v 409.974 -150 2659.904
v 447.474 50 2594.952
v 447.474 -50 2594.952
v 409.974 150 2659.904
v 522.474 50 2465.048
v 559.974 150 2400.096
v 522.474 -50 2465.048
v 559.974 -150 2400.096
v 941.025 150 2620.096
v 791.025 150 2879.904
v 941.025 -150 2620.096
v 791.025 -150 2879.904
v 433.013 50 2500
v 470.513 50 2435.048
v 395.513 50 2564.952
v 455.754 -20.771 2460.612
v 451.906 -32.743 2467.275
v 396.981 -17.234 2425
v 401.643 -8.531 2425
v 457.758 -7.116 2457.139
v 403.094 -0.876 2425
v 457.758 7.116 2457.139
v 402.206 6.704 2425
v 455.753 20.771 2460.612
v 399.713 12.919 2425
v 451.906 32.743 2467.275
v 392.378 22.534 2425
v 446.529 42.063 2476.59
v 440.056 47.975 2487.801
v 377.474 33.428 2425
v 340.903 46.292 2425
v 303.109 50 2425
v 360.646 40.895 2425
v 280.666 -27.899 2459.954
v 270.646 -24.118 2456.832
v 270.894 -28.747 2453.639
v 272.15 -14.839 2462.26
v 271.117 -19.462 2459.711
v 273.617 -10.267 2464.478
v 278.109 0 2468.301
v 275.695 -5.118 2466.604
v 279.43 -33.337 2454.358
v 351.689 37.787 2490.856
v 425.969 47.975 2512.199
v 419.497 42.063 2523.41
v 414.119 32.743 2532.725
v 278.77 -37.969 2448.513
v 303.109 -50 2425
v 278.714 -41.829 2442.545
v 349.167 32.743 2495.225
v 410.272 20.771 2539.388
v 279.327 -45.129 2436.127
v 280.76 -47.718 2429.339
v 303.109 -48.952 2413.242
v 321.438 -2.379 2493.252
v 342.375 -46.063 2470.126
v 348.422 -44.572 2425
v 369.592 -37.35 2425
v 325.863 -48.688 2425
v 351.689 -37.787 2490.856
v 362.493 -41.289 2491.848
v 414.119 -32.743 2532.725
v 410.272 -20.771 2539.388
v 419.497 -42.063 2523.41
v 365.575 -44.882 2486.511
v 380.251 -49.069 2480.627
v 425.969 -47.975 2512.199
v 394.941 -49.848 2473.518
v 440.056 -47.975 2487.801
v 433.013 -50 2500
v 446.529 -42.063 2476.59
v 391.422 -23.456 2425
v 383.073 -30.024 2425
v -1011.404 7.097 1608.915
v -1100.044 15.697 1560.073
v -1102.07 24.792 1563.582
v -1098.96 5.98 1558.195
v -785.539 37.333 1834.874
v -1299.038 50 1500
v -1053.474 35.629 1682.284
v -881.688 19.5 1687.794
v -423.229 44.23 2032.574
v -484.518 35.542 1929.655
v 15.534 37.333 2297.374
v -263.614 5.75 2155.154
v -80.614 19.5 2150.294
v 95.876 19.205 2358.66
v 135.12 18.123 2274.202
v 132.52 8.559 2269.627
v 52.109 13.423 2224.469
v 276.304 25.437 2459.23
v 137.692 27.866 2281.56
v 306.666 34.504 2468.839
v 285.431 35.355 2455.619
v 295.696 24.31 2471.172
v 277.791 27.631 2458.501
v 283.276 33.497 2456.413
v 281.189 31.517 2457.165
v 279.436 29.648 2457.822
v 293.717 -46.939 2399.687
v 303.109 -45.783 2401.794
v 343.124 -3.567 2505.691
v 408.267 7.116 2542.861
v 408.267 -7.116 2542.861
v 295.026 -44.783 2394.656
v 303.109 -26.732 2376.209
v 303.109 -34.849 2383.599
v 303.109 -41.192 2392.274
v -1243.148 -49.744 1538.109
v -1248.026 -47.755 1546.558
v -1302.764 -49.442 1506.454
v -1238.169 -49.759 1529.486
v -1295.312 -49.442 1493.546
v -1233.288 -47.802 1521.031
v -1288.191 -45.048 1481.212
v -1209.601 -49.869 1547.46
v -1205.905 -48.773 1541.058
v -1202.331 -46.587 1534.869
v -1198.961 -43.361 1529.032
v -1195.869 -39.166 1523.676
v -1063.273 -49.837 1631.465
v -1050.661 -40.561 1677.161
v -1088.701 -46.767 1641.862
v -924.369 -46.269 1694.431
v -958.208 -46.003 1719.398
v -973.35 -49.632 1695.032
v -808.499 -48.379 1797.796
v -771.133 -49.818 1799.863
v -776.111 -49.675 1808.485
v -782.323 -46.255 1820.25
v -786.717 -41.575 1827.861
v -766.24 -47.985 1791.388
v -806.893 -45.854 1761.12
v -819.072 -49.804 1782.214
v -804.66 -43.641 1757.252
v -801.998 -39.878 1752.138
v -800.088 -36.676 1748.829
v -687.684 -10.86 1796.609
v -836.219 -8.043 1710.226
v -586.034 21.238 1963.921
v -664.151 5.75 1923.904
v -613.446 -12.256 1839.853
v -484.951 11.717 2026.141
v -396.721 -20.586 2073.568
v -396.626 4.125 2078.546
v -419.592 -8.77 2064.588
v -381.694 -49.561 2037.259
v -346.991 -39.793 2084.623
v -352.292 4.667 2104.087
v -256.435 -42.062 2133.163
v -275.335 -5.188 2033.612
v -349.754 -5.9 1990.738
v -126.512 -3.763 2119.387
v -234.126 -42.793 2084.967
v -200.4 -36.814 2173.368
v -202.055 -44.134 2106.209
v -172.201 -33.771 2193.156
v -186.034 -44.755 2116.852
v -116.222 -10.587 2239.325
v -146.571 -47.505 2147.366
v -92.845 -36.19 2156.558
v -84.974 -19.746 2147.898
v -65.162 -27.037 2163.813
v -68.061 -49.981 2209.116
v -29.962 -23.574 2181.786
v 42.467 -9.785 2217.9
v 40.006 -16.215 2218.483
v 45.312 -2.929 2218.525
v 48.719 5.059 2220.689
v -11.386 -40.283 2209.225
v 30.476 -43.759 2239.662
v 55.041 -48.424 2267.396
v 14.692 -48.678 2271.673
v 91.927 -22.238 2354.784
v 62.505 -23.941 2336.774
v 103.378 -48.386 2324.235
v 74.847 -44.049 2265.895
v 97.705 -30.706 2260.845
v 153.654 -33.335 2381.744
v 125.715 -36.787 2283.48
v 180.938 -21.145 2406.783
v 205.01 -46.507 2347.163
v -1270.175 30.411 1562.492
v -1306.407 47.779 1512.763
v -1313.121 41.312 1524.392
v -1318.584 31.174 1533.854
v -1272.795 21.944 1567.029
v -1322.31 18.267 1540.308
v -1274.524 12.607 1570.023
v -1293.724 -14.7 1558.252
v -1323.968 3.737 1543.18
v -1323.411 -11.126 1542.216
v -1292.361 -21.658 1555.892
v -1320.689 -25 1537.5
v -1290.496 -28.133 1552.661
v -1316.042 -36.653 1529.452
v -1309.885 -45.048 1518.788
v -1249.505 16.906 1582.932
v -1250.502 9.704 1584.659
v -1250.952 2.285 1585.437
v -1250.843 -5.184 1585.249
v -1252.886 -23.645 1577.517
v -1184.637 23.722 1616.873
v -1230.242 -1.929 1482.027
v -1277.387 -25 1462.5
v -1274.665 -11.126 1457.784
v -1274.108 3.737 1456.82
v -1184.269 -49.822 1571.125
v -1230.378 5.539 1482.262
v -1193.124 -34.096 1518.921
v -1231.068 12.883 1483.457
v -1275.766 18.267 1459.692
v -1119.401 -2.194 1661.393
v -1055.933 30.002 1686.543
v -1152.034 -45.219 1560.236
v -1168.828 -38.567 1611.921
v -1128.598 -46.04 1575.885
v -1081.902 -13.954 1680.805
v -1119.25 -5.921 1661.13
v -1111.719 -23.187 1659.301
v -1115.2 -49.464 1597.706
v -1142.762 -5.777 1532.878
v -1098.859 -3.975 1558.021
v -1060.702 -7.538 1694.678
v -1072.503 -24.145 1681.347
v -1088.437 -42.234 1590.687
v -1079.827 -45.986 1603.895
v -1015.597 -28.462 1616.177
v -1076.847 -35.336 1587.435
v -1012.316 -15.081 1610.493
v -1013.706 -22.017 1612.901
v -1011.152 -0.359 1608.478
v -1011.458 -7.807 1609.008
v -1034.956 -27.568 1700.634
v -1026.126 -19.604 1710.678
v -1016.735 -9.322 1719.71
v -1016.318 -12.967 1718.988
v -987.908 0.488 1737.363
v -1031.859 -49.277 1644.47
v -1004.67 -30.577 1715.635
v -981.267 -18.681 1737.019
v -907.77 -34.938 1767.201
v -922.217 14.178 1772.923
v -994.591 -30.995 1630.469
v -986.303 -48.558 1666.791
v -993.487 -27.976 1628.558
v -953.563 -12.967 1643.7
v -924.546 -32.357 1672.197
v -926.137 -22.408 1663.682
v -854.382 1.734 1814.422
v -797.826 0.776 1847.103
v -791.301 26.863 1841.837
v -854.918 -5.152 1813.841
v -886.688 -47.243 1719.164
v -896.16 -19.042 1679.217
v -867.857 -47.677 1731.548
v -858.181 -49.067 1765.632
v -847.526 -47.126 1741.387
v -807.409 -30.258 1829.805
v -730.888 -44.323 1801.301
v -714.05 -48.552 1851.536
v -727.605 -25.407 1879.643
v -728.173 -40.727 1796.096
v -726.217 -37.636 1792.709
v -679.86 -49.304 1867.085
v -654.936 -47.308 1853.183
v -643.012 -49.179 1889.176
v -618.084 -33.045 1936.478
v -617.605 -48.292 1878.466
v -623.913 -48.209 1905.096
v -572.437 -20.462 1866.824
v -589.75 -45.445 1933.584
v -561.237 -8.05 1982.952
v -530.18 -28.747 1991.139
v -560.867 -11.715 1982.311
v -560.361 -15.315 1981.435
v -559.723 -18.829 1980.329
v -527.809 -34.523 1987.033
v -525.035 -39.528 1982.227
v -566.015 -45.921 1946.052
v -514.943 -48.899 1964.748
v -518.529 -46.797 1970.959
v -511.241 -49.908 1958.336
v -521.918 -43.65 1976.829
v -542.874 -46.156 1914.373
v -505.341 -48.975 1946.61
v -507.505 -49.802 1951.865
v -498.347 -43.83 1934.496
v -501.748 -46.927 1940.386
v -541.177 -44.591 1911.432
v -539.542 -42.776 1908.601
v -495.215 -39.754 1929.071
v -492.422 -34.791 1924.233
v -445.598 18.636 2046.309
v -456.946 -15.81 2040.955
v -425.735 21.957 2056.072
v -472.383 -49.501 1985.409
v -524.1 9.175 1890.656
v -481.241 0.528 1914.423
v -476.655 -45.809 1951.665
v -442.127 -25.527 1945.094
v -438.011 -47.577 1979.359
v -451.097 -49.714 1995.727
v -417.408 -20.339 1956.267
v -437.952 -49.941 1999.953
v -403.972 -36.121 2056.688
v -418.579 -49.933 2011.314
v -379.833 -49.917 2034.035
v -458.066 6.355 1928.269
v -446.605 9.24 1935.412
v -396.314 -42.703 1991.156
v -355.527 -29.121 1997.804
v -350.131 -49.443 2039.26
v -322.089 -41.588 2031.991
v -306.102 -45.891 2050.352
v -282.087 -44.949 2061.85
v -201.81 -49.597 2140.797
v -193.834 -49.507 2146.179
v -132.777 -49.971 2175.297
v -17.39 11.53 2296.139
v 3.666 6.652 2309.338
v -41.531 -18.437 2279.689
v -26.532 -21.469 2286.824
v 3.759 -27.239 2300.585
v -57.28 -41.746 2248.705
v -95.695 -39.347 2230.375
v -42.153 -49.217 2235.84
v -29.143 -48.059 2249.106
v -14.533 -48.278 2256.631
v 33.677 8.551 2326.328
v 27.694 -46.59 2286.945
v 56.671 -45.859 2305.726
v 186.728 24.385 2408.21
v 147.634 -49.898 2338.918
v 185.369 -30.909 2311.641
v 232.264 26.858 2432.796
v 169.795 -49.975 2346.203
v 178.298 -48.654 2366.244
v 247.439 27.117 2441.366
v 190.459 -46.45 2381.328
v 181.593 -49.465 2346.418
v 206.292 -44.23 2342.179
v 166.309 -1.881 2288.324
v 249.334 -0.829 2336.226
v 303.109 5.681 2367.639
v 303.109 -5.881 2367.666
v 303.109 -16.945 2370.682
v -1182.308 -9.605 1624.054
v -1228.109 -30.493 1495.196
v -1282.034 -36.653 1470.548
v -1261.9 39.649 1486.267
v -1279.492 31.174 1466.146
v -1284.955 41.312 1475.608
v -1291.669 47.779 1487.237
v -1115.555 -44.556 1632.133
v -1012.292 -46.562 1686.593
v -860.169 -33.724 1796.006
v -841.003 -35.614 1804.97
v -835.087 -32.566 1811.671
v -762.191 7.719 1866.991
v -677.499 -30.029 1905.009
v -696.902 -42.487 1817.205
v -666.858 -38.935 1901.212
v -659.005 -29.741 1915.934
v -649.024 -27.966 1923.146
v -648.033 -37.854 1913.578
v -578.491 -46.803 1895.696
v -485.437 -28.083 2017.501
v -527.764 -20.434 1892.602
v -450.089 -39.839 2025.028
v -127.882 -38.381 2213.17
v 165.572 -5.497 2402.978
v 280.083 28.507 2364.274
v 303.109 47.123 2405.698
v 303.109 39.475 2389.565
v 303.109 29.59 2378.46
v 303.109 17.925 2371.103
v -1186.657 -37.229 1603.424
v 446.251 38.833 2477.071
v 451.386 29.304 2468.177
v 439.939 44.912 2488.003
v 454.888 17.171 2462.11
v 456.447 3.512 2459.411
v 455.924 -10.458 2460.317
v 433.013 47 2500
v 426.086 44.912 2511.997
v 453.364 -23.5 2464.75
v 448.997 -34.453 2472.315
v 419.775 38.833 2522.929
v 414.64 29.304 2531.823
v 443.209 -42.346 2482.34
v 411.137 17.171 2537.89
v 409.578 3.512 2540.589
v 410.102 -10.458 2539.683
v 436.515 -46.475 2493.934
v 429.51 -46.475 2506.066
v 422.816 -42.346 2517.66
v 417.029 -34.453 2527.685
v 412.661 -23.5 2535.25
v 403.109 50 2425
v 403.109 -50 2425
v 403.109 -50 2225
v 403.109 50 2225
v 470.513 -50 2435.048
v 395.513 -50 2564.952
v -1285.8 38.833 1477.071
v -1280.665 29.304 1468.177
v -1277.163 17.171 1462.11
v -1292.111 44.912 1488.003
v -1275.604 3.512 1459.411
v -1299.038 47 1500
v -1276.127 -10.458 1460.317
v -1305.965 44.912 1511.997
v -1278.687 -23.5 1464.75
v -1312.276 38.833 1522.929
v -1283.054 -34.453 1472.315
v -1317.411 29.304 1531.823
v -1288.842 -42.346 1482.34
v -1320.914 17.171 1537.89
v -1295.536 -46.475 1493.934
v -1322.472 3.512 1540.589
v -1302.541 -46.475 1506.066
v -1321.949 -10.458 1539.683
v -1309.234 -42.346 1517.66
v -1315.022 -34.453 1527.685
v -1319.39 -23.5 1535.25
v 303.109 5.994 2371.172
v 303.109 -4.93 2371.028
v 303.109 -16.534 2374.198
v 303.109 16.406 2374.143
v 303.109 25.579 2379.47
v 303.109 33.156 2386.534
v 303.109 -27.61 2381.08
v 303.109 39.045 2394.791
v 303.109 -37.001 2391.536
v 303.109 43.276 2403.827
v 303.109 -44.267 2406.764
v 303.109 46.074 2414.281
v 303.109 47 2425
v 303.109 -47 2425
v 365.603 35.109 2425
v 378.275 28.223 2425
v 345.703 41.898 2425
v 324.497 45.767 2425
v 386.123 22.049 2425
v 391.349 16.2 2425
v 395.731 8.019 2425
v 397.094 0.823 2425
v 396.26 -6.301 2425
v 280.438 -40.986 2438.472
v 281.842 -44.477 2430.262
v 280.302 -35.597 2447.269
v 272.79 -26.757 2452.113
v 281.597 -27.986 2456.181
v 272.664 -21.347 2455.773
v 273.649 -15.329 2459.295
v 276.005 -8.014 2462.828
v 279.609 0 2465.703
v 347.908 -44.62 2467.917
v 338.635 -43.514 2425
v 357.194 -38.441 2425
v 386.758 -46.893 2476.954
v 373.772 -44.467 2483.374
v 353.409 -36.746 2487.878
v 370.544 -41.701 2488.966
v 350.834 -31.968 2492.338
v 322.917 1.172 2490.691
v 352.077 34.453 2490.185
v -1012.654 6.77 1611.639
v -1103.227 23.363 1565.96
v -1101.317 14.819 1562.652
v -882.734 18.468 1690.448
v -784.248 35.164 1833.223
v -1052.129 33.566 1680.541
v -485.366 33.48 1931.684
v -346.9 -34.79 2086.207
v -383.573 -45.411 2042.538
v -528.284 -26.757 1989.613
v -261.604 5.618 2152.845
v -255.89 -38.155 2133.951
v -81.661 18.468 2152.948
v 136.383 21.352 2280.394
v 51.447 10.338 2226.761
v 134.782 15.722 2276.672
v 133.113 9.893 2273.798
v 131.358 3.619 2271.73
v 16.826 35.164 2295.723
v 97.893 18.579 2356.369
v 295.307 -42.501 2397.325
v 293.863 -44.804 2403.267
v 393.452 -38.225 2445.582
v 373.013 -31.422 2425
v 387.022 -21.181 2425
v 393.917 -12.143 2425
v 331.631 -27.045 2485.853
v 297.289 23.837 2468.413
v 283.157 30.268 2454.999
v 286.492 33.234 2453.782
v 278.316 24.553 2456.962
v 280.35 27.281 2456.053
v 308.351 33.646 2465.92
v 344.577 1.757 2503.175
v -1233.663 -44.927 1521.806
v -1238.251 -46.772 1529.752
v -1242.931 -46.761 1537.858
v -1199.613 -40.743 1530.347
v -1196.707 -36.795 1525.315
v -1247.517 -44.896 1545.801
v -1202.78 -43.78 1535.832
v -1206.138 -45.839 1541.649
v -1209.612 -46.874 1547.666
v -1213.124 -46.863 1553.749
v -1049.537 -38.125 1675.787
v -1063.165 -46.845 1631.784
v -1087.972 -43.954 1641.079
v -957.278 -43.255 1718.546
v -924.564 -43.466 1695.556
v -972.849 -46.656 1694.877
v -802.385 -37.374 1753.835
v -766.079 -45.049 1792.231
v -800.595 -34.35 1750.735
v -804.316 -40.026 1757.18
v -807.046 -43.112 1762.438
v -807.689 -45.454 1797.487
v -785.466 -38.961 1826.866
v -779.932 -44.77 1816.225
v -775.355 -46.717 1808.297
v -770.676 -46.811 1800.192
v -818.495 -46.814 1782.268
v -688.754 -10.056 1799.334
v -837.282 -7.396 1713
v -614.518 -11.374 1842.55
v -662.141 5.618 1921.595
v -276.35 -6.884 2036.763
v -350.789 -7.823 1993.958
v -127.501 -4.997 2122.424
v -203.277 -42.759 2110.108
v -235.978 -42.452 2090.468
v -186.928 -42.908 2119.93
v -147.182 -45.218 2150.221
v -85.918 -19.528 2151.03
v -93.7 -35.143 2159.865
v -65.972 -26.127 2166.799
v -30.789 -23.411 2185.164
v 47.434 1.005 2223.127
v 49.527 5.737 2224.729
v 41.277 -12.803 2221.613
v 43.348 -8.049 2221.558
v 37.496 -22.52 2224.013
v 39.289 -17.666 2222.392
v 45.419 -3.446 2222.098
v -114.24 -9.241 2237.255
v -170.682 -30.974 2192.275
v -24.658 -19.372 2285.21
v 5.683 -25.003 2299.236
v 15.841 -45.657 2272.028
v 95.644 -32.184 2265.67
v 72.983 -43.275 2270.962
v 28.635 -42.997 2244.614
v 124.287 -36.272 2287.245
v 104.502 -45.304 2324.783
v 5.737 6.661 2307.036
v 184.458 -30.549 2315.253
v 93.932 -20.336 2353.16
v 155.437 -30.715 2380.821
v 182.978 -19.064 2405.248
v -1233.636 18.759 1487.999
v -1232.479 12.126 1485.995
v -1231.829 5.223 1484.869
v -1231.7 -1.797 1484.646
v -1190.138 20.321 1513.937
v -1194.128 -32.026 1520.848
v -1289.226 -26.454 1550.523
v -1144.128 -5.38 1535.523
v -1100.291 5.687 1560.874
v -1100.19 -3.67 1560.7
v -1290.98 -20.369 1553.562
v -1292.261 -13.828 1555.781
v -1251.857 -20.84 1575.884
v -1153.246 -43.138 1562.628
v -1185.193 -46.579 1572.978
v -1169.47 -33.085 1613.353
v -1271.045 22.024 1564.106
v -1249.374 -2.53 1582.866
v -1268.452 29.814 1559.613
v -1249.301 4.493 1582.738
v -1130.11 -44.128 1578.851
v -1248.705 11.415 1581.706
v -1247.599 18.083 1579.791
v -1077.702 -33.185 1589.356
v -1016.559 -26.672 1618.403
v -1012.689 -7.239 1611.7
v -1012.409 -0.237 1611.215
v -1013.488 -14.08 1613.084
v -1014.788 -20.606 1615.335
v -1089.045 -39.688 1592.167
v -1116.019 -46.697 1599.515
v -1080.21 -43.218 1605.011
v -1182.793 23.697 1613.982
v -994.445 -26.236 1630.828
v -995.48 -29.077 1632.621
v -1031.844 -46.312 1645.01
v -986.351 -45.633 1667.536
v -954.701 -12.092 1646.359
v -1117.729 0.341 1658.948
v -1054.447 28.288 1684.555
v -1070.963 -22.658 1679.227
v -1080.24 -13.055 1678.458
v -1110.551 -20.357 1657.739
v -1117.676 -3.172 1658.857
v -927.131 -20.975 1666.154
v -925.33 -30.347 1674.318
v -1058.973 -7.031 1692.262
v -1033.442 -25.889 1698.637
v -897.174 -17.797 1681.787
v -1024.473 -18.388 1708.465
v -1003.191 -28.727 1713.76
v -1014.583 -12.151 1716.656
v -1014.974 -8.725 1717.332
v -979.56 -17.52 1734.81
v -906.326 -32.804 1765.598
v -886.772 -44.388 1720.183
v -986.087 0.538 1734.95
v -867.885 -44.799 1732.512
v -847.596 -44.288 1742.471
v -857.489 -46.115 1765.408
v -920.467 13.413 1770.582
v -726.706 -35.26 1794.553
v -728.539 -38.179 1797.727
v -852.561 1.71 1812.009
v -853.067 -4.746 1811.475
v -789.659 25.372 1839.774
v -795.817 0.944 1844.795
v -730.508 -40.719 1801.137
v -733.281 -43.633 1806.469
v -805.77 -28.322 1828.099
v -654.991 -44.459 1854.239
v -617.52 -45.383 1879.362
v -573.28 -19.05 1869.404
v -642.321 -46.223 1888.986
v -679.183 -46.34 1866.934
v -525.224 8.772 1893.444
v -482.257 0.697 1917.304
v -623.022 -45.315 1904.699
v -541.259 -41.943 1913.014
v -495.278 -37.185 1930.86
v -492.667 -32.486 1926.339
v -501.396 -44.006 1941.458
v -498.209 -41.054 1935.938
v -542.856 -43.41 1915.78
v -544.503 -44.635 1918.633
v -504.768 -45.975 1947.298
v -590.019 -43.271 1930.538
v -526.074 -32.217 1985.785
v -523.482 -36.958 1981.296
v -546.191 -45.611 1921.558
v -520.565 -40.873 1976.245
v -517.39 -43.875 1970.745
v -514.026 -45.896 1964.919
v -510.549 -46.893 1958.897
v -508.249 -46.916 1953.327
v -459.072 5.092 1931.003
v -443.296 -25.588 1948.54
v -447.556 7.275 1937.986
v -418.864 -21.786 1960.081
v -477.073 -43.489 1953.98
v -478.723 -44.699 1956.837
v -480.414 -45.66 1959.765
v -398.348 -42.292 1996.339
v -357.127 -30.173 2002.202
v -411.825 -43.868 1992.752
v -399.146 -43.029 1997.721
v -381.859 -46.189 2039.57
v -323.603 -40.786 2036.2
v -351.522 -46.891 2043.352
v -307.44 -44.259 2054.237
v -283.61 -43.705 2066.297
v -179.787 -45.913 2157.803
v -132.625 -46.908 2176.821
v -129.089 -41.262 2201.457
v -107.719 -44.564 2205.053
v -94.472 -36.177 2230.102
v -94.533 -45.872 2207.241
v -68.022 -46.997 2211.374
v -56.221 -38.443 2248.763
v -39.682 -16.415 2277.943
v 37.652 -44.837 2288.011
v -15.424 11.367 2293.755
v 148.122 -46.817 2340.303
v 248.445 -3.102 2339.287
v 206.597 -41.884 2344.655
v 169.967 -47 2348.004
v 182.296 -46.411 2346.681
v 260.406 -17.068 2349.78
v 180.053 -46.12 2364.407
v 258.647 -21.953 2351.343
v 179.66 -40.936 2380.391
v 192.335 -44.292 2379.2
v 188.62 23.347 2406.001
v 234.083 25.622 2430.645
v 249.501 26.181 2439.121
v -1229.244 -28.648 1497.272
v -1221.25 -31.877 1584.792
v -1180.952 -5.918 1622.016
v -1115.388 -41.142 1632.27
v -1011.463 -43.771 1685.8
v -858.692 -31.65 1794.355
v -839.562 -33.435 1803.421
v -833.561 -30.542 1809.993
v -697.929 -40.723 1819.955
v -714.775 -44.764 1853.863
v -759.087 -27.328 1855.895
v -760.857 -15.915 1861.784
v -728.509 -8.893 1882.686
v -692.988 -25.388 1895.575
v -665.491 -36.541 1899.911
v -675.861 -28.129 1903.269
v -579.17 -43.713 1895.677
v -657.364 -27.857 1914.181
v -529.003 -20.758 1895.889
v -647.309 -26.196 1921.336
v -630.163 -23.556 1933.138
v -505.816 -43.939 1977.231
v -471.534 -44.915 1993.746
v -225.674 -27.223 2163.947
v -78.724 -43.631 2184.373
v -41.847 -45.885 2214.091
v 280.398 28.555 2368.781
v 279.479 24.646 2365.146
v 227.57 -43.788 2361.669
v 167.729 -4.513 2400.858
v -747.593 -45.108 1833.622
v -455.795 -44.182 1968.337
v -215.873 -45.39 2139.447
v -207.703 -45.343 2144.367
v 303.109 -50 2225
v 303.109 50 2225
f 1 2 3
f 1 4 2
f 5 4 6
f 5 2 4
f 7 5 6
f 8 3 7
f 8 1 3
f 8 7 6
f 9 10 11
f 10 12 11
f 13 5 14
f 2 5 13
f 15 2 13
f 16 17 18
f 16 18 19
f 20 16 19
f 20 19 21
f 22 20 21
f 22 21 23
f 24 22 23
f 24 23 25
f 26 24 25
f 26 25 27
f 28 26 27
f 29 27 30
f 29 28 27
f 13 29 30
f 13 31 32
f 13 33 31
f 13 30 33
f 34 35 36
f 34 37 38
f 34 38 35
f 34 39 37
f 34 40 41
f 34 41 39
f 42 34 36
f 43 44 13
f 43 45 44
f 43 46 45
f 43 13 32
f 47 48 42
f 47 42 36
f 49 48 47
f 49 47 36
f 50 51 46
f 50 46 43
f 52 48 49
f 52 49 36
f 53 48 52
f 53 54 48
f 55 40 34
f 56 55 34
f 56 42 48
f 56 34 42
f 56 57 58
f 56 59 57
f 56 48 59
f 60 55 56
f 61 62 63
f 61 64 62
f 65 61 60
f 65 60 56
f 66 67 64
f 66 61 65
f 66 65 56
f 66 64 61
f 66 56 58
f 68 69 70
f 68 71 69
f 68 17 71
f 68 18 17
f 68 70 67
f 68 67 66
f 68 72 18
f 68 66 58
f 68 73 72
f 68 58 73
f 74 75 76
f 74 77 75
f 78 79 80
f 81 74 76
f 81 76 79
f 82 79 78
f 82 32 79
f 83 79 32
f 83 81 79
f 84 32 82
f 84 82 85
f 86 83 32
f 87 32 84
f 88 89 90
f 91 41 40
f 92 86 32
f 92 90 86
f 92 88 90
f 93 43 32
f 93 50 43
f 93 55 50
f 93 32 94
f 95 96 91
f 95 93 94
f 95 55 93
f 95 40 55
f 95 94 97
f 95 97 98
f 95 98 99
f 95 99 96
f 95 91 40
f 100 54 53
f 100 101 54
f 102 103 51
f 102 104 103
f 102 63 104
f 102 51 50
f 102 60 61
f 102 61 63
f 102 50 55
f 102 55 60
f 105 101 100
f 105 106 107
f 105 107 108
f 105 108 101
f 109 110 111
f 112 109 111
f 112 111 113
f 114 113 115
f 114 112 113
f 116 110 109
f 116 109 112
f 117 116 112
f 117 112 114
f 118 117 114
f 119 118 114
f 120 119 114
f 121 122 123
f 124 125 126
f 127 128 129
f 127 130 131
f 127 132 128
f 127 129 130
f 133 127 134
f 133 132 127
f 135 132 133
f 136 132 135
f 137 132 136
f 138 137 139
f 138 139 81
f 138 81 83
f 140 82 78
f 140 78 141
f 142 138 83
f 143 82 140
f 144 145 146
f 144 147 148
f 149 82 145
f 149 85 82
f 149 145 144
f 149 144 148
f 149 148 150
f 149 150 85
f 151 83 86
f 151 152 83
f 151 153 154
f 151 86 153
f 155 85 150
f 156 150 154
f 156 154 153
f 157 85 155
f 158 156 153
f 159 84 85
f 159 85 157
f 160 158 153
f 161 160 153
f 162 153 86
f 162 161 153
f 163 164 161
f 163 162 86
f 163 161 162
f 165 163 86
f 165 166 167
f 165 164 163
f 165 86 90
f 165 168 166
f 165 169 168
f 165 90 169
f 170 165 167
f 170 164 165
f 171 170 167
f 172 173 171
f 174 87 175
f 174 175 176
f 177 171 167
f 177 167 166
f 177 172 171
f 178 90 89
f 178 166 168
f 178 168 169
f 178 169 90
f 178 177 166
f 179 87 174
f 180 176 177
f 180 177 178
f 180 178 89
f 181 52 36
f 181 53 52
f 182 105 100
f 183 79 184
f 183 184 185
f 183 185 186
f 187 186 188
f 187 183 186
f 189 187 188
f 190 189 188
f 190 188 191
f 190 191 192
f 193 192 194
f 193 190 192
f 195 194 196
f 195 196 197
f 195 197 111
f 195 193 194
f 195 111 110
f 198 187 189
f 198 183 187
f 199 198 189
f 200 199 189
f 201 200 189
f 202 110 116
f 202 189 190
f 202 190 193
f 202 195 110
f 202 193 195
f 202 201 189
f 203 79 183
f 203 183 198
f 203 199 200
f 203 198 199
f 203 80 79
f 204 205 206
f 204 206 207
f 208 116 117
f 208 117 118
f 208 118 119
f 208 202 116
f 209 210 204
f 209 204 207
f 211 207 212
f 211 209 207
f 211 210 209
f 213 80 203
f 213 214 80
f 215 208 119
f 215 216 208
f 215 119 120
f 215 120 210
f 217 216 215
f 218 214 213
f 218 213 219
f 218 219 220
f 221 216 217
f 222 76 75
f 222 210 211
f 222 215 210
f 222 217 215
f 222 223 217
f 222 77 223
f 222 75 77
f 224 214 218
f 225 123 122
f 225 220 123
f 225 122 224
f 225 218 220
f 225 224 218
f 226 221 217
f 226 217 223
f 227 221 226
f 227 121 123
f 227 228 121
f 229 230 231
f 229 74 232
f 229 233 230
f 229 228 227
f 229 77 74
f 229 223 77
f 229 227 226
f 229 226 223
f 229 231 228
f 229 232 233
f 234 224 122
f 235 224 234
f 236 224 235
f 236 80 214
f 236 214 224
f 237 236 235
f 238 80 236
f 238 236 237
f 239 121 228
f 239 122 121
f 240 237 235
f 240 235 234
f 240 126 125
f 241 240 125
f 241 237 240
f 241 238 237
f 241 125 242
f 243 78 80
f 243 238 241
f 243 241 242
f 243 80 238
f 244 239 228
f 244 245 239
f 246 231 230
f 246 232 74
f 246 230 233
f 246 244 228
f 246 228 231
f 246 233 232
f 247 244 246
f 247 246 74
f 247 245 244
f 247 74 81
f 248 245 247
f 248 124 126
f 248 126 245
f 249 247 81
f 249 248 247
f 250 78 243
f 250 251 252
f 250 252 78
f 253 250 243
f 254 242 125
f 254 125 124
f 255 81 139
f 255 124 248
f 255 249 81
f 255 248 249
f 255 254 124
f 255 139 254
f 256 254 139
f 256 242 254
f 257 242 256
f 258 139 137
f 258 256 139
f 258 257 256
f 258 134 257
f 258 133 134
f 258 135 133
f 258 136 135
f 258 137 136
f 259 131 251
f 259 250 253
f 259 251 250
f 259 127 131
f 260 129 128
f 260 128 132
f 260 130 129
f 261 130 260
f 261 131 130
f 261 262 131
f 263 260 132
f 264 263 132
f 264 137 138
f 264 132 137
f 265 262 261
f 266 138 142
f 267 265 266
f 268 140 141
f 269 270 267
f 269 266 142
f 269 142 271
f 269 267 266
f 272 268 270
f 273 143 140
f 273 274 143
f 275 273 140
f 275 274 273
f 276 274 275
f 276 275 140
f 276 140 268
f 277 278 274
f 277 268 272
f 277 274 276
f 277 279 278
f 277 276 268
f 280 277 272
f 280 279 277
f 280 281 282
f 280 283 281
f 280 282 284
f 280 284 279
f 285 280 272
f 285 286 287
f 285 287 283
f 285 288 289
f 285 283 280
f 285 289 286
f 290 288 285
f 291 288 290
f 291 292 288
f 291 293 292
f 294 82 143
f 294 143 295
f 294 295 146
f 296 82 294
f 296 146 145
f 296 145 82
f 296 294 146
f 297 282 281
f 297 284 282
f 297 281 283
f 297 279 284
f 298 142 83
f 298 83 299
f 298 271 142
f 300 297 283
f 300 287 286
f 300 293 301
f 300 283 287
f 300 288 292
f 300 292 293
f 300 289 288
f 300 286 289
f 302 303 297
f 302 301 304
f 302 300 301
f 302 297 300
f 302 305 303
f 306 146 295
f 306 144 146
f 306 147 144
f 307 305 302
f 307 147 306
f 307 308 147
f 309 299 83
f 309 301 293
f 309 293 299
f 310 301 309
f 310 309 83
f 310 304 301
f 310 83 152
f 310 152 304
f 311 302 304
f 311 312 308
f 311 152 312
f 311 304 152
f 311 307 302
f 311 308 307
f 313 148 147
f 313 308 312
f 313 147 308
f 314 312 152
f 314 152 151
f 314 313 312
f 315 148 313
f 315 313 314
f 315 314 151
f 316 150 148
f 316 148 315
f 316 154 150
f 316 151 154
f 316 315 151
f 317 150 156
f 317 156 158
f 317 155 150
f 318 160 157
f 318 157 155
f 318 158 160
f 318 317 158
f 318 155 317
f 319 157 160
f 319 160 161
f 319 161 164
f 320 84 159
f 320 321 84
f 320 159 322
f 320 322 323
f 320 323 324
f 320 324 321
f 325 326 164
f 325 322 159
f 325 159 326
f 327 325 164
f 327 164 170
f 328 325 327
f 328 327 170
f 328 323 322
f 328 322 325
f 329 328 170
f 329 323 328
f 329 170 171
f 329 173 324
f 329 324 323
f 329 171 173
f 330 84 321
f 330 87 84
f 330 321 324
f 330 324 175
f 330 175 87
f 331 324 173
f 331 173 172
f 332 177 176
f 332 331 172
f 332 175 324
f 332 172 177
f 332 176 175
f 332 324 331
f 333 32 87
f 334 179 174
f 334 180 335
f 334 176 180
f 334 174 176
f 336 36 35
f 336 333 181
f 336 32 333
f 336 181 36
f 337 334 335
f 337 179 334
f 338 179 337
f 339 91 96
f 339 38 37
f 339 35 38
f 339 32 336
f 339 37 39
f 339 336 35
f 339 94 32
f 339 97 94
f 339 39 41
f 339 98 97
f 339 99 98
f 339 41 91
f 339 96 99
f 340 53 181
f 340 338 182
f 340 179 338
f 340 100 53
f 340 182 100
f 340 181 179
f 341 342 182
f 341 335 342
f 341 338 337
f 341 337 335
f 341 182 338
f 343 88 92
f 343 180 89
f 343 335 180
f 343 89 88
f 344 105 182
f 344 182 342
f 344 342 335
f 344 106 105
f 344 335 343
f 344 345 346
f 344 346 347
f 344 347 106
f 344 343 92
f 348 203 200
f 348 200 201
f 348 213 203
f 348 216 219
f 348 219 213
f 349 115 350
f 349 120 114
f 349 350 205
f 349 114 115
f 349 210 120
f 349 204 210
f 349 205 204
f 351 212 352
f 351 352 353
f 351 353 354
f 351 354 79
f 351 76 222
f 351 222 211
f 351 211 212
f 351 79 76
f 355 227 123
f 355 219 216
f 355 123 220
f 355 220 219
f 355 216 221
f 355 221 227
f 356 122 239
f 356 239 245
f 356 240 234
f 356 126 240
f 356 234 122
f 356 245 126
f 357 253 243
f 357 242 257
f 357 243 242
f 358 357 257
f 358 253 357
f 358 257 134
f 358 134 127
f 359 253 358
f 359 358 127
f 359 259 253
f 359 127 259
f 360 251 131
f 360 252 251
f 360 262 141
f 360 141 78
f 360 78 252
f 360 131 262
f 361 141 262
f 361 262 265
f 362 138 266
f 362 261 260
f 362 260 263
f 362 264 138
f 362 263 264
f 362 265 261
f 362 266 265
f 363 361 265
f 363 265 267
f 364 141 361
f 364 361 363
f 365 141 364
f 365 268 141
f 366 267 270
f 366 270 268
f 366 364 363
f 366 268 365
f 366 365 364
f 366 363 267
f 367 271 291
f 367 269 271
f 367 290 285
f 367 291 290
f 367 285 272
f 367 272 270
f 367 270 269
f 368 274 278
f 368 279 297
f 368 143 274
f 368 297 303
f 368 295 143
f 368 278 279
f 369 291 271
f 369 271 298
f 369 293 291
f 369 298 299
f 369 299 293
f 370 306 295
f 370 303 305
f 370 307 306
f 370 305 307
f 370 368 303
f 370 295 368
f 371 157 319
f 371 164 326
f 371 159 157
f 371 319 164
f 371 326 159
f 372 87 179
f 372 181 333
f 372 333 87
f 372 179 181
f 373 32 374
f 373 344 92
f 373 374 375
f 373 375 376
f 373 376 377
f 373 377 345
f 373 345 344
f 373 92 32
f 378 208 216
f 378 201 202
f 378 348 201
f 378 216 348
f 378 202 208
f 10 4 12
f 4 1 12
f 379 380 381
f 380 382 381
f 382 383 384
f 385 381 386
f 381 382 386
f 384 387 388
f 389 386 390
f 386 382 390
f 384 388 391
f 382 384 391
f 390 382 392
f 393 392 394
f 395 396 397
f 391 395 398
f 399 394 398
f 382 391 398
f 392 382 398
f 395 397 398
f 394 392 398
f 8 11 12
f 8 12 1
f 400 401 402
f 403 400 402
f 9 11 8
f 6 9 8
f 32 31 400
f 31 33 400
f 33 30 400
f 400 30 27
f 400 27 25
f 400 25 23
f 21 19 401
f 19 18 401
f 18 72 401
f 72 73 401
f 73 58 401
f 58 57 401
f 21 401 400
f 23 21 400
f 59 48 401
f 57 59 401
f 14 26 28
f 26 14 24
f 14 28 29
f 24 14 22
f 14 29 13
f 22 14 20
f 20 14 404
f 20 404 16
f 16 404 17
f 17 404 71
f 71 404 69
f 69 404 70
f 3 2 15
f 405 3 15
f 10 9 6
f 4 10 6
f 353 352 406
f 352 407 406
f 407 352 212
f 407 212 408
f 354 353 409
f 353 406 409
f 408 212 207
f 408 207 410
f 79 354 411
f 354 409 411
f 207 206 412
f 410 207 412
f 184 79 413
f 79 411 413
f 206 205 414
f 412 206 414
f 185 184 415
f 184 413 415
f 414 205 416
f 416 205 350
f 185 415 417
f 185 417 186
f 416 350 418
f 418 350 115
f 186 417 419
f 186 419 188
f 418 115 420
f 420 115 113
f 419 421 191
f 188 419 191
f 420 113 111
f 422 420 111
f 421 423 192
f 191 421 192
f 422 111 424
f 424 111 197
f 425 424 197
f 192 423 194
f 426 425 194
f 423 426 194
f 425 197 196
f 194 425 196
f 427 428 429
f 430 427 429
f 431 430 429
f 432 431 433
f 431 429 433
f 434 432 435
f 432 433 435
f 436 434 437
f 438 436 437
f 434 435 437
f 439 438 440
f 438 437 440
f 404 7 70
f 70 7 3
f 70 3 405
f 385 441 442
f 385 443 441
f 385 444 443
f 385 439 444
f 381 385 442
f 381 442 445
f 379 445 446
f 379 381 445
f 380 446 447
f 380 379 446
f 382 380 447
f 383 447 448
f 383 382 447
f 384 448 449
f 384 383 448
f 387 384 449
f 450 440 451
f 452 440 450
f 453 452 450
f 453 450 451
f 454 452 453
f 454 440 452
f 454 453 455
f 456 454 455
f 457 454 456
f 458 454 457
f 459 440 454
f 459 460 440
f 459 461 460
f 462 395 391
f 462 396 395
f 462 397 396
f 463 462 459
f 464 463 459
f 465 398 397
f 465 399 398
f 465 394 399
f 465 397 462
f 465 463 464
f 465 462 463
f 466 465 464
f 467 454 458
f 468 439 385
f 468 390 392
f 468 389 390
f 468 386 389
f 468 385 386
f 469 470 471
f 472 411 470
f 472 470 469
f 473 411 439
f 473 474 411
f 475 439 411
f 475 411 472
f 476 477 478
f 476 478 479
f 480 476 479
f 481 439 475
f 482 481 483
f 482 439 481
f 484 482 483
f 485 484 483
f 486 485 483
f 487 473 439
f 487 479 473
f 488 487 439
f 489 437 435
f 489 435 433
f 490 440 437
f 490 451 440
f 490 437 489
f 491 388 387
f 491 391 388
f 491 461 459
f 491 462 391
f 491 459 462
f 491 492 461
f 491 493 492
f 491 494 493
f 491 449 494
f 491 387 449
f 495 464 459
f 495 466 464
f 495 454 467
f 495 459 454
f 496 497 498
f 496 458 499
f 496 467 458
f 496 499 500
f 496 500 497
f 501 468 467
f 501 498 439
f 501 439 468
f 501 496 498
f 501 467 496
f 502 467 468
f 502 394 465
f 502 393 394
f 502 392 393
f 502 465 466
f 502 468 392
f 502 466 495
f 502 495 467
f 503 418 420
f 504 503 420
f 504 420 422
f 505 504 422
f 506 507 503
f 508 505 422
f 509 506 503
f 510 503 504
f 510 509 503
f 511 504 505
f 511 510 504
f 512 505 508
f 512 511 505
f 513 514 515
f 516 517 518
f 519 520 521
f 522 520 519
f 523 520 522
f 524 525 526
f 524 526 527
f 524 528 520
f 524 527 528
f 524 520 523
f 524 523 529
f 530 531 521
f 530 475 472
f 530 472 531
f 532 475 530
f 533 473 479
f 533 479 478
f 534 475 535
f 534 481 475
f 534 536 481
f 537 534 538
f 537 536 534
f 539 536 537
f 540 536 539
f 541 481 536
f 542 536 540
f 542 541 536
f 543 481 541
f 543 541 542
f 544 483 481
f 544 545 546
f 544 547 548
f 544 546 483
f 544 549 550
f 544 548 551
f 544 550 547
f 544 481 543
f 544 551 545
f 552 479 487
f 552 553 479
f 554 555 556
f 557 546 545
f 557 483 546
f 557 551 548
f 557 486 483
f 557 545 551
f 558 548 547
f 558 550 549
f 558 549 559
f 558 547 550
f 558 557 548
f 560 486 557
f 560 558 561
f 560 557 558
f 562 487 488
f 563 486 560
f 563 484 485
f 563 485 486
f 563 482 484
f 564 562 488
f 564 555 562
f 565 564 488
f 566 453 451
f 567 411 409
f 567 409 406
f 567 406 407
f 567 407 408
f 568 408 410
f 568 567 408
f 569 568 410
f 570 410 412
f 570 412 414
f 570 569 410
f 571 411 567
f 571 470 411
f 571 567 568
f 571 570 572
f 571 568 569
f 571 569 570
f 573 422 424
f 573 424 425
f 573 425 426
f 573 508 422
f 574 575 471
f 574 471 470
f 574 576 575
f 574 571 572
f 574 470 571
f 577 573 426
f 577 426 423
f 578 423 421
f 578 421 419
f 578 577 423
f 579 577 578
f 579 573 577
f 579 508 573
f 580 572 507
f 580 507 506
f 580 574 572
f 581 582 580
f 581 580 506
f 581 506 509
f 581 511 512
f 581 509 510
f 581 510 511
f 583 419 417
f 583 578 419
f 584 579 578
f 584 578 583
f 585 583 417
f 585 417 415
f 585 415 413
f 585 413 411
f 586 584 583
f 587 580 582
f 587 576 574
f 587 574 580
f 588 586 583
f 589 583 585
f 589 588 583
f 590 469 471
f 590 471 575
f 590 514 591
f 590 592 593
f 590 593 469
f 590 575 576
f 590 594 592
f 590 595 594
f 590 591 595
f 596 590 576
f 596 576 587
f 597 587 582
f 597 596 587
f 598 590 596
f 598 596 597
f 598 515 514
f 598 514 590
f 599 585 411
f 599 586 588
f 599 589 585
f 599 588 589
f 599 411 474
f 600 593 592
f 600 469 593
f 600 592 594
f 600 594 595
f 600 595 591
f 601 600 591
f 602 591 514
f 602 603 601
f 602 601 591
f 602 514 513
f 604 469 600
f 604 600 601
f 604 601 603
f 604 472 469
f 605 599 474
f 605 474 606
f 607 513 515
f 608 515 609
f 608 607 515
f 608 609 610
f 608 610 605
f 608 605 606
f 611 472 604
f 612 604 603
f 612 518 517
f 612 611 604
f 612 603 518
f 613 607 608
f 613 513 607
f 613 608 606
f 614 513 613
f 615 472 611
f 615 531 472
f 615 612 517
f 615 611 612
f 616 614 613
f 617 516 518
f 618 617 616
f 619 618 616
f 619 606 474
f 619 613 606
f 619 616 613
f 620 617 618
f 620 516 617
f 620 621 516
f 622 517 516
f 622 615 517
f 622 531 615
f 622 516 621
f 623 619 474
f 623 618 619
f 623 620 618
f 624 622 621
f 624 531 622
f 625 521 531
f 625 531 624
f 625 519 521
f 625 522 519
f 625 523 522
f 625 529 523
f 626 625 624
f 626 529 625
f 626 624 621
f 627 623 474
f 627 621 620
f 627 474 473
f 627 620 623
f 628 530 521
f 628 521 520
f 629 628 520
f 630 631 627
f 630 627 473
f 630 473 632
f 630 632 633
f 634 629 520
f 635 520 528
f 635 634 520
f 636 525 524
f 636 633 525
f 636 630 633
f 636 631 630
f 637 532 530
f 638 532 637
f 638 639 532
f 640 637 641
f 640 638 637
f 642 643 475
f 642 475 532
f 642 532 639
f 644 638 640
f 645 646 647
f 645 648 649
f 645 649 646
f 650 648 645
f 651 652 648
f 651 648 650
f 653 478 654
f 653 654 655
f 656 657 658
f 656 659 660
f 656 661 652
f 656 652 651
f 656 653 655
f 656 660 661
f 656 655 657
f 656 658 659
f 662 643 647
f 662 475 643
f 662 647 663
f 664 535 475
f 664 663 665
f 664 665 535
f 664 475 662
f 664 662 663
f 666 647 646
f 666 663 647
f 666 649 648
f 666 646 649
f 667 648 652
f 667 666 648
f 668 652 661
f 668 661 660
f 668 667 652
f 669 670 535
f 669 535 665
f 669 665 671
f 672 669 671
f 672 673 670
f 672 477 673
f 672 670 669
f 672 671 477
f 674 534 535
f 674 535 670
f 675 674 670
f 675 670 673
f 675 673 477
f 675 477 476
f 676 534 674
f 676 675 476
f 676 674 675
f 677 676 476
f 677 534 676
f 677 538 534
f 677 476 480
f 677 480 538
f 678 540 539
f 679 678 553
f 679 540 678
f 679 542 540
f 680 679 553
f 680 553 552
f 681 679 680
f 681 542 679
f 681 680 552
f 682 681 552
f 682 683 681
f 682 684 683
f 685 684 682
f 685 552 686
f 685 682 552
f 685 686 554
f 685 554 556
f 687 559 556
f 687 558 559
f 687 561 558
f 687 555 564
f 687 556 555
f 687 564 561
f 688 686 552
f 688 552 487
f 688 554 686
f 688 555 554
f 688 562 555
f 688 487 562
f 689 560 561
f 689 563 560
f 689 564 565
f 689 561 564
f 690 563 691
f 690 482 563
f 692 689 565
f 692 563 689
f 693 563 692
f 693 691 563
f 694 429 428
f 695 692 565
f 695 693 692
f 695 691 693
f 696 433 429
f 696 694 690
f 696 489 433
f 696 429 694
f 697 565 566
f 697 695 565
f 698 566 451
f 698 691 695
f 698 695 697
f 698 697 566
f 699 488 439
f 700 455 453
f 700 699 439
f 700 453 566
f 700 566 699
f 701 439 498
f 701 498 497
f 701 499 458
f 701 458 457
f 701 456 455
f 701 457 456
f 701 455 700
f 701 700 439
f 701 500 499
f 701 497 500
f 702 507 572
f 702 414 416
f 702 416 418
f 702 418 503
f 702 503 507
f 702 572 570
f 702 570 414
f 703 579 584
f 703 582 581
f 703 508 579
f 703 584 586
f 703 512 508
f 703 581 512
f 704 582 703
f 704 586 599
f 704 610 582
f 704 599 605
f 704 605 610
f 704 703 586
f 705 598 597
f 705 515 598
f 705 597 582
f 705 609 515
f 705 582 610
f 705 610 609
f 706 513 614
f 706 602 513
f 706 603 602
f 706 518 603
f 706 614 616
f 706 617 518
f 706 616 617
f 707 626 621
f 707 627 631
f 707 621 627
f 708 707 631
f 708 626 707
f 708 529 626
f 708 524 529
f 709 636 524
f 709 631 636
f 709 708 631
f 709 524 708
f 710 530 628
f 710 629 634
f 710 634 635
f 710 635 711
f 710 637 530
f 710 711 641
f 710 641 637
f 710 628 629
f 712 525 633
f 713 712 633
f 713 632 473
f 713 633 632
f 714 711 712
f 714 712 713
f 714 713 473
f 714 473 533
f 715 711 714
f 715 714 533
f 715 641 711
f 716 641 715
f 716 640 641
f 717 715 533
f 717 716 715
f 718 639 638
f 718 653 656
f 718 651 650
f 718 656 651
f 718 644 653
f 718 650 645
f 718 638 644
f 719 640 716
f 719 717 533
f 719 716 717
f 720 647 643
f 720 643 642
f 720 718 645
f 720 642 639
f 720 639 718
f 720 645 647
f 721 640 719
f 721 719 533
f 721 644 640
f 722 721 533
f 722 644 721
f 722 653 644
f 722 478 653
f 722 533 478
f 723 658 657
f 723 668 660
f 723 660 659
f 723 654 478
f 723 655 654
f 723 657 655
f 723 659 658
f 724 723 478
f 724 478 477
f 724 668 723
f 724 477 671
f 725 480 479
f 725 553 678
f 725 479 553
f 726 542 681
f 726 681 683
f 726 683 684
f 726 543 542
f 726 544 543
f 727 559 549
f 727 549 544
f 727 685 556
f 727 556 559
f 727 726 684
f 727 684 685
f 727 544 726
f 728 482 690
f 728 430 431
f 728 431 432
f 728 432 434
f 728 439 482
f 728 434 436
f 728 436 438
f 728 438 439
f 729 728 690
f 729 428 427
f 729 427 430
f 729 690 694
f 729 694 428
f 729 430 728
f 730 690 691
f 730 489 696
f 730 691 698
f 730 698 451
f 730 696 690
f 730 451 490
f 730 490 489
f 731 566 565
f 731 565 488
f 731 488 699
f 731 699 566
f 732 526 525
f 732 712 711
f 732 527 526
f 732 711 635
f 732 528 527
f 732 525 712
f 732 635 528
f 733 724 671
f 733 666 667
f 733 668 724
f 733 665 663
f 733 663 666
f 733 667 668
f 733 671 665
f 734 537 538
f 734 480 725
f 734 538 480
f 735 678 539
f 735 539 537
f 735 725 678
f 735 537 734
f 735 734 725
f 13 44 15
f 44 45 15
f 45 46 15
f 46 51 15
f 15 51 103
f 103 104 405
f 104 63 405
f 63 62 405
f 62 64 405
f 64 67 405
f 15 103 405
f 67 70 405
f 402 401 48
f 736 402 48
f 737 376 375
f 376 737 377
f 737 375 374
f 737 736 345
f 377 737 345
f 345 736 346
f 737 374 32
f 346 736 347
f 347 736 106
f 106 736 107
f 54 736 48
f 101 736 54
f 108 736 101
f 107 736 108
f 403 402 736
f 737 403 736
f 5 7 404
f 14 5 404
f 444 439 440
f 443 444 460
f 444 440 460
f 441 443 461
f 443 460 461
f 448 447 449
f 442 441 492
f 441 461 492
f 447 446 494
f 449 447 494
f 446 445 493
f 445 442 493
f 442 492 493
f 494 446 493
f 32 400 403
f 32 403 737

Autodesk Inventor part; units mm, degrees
ref_plane "YZ Plane" through (0, 0, 0) normal (1, 0, 0) x (0, 1, 0)
ref_plane "XZ Plane" through (0, 0, 0) normal (0, 1, 0) x (-1, 0, 0)
ref_plane "XY Plane" through (0, 0, 0) normal (0, 0, 1) x (1, 0, 0)
sketch "Sketch2" plane through (0, 0, 0) normal (0, 1, 0) x (-1, 0, 0)
  line L0 (1299.0381, 1500) -> (-433.0127, 2500)
  line L1 (1299.0381, 1500) -> (-700.9619, 1500) construction
  line L2 (0, 0) -> (0, 2250)
  line L3 (-358.0127, 2629.9038) -> (-791.0254, 2879.9038)
  line L4 (-791.0254, 2879.9038) -> (-941.0254, 2620.0962)
  line L5 (-941.0254, 2620.0962) -> (-508.0127, 2370.0962)
  line L6 (-508.0127, 2370.0962) -> (-358.0127, 2629.9038)
  line L7 (-409.9742, 2659.9038) -> (-559.9742, 2400.0962)
  line L8 (-447.4742, 2594.9519) -> (-395.5127, 2564.9519)
  line L9 (-522.4742, 2465.0481) -> (-470.5127, 2435.0481)
  line L10 (-303.1089, 2425) -> (-403.1089, 2425)
  line L11 (-403.1089, 2425) -> (-403.1089, 2225)
  line L12 (-403.1089, 2225) -> (-303.1089, 2225)
  line L13 (-303.1089, 2225) -> (-303.1089, 2425)
  line L14 (-303.1089, 2425) -> (-403.1089, 2225) construction
  line L15 (-403.1089, 2425) -> (-303.1089, 2225) construction
  point P0 (-353.1089, 2325)
  dimension "d3" = 30
  dimension "d4" = 2000
  dimension "d10" = 2250
  dimension "d11" = 500
  dimension "d12" = 500
  dimension "d13" = 300
  dimension "d14" = 150
  dimension "d15" = 60
  dimension "d16" = 100
  dimension "d17" = 200
  dimension "d18" = 150
ref_plane "Work Plane1" through (-1299.0381, 0, 1500) normal (0.866, 0, 0.5) x (0, 1, 0)
sketch "Sketch3" plane through (-1299.0381, 0, 1500) normal (0.866, 0, 0.5) x (0, 1, 0)
  circle A0 centre (0, 0) radius 50
  circle A1 centre (0, 0) radius 47
  point P0 (0, -1948.5572)
  point P1 (0, 0)
  dimension "d6" = 100
  dimension "d7" = 3
sweep "Sweep1" add profiles "Sketch3" path "Sketch2" path curves L0
extrude "Extrusion2" add sketch "Sketch2" along normal mid plane 100 contours L6 L9 L7 L8 | L13 L12 L11 L10
extrude "Extrusion3" add sketch "Sketch2" along normal mid plane 300 contours L7 L5 L4 L3
equation "\"d16\" = d6"
equation "\"d19\" = d6"
properties part number "NDM-VOS dummy5"
